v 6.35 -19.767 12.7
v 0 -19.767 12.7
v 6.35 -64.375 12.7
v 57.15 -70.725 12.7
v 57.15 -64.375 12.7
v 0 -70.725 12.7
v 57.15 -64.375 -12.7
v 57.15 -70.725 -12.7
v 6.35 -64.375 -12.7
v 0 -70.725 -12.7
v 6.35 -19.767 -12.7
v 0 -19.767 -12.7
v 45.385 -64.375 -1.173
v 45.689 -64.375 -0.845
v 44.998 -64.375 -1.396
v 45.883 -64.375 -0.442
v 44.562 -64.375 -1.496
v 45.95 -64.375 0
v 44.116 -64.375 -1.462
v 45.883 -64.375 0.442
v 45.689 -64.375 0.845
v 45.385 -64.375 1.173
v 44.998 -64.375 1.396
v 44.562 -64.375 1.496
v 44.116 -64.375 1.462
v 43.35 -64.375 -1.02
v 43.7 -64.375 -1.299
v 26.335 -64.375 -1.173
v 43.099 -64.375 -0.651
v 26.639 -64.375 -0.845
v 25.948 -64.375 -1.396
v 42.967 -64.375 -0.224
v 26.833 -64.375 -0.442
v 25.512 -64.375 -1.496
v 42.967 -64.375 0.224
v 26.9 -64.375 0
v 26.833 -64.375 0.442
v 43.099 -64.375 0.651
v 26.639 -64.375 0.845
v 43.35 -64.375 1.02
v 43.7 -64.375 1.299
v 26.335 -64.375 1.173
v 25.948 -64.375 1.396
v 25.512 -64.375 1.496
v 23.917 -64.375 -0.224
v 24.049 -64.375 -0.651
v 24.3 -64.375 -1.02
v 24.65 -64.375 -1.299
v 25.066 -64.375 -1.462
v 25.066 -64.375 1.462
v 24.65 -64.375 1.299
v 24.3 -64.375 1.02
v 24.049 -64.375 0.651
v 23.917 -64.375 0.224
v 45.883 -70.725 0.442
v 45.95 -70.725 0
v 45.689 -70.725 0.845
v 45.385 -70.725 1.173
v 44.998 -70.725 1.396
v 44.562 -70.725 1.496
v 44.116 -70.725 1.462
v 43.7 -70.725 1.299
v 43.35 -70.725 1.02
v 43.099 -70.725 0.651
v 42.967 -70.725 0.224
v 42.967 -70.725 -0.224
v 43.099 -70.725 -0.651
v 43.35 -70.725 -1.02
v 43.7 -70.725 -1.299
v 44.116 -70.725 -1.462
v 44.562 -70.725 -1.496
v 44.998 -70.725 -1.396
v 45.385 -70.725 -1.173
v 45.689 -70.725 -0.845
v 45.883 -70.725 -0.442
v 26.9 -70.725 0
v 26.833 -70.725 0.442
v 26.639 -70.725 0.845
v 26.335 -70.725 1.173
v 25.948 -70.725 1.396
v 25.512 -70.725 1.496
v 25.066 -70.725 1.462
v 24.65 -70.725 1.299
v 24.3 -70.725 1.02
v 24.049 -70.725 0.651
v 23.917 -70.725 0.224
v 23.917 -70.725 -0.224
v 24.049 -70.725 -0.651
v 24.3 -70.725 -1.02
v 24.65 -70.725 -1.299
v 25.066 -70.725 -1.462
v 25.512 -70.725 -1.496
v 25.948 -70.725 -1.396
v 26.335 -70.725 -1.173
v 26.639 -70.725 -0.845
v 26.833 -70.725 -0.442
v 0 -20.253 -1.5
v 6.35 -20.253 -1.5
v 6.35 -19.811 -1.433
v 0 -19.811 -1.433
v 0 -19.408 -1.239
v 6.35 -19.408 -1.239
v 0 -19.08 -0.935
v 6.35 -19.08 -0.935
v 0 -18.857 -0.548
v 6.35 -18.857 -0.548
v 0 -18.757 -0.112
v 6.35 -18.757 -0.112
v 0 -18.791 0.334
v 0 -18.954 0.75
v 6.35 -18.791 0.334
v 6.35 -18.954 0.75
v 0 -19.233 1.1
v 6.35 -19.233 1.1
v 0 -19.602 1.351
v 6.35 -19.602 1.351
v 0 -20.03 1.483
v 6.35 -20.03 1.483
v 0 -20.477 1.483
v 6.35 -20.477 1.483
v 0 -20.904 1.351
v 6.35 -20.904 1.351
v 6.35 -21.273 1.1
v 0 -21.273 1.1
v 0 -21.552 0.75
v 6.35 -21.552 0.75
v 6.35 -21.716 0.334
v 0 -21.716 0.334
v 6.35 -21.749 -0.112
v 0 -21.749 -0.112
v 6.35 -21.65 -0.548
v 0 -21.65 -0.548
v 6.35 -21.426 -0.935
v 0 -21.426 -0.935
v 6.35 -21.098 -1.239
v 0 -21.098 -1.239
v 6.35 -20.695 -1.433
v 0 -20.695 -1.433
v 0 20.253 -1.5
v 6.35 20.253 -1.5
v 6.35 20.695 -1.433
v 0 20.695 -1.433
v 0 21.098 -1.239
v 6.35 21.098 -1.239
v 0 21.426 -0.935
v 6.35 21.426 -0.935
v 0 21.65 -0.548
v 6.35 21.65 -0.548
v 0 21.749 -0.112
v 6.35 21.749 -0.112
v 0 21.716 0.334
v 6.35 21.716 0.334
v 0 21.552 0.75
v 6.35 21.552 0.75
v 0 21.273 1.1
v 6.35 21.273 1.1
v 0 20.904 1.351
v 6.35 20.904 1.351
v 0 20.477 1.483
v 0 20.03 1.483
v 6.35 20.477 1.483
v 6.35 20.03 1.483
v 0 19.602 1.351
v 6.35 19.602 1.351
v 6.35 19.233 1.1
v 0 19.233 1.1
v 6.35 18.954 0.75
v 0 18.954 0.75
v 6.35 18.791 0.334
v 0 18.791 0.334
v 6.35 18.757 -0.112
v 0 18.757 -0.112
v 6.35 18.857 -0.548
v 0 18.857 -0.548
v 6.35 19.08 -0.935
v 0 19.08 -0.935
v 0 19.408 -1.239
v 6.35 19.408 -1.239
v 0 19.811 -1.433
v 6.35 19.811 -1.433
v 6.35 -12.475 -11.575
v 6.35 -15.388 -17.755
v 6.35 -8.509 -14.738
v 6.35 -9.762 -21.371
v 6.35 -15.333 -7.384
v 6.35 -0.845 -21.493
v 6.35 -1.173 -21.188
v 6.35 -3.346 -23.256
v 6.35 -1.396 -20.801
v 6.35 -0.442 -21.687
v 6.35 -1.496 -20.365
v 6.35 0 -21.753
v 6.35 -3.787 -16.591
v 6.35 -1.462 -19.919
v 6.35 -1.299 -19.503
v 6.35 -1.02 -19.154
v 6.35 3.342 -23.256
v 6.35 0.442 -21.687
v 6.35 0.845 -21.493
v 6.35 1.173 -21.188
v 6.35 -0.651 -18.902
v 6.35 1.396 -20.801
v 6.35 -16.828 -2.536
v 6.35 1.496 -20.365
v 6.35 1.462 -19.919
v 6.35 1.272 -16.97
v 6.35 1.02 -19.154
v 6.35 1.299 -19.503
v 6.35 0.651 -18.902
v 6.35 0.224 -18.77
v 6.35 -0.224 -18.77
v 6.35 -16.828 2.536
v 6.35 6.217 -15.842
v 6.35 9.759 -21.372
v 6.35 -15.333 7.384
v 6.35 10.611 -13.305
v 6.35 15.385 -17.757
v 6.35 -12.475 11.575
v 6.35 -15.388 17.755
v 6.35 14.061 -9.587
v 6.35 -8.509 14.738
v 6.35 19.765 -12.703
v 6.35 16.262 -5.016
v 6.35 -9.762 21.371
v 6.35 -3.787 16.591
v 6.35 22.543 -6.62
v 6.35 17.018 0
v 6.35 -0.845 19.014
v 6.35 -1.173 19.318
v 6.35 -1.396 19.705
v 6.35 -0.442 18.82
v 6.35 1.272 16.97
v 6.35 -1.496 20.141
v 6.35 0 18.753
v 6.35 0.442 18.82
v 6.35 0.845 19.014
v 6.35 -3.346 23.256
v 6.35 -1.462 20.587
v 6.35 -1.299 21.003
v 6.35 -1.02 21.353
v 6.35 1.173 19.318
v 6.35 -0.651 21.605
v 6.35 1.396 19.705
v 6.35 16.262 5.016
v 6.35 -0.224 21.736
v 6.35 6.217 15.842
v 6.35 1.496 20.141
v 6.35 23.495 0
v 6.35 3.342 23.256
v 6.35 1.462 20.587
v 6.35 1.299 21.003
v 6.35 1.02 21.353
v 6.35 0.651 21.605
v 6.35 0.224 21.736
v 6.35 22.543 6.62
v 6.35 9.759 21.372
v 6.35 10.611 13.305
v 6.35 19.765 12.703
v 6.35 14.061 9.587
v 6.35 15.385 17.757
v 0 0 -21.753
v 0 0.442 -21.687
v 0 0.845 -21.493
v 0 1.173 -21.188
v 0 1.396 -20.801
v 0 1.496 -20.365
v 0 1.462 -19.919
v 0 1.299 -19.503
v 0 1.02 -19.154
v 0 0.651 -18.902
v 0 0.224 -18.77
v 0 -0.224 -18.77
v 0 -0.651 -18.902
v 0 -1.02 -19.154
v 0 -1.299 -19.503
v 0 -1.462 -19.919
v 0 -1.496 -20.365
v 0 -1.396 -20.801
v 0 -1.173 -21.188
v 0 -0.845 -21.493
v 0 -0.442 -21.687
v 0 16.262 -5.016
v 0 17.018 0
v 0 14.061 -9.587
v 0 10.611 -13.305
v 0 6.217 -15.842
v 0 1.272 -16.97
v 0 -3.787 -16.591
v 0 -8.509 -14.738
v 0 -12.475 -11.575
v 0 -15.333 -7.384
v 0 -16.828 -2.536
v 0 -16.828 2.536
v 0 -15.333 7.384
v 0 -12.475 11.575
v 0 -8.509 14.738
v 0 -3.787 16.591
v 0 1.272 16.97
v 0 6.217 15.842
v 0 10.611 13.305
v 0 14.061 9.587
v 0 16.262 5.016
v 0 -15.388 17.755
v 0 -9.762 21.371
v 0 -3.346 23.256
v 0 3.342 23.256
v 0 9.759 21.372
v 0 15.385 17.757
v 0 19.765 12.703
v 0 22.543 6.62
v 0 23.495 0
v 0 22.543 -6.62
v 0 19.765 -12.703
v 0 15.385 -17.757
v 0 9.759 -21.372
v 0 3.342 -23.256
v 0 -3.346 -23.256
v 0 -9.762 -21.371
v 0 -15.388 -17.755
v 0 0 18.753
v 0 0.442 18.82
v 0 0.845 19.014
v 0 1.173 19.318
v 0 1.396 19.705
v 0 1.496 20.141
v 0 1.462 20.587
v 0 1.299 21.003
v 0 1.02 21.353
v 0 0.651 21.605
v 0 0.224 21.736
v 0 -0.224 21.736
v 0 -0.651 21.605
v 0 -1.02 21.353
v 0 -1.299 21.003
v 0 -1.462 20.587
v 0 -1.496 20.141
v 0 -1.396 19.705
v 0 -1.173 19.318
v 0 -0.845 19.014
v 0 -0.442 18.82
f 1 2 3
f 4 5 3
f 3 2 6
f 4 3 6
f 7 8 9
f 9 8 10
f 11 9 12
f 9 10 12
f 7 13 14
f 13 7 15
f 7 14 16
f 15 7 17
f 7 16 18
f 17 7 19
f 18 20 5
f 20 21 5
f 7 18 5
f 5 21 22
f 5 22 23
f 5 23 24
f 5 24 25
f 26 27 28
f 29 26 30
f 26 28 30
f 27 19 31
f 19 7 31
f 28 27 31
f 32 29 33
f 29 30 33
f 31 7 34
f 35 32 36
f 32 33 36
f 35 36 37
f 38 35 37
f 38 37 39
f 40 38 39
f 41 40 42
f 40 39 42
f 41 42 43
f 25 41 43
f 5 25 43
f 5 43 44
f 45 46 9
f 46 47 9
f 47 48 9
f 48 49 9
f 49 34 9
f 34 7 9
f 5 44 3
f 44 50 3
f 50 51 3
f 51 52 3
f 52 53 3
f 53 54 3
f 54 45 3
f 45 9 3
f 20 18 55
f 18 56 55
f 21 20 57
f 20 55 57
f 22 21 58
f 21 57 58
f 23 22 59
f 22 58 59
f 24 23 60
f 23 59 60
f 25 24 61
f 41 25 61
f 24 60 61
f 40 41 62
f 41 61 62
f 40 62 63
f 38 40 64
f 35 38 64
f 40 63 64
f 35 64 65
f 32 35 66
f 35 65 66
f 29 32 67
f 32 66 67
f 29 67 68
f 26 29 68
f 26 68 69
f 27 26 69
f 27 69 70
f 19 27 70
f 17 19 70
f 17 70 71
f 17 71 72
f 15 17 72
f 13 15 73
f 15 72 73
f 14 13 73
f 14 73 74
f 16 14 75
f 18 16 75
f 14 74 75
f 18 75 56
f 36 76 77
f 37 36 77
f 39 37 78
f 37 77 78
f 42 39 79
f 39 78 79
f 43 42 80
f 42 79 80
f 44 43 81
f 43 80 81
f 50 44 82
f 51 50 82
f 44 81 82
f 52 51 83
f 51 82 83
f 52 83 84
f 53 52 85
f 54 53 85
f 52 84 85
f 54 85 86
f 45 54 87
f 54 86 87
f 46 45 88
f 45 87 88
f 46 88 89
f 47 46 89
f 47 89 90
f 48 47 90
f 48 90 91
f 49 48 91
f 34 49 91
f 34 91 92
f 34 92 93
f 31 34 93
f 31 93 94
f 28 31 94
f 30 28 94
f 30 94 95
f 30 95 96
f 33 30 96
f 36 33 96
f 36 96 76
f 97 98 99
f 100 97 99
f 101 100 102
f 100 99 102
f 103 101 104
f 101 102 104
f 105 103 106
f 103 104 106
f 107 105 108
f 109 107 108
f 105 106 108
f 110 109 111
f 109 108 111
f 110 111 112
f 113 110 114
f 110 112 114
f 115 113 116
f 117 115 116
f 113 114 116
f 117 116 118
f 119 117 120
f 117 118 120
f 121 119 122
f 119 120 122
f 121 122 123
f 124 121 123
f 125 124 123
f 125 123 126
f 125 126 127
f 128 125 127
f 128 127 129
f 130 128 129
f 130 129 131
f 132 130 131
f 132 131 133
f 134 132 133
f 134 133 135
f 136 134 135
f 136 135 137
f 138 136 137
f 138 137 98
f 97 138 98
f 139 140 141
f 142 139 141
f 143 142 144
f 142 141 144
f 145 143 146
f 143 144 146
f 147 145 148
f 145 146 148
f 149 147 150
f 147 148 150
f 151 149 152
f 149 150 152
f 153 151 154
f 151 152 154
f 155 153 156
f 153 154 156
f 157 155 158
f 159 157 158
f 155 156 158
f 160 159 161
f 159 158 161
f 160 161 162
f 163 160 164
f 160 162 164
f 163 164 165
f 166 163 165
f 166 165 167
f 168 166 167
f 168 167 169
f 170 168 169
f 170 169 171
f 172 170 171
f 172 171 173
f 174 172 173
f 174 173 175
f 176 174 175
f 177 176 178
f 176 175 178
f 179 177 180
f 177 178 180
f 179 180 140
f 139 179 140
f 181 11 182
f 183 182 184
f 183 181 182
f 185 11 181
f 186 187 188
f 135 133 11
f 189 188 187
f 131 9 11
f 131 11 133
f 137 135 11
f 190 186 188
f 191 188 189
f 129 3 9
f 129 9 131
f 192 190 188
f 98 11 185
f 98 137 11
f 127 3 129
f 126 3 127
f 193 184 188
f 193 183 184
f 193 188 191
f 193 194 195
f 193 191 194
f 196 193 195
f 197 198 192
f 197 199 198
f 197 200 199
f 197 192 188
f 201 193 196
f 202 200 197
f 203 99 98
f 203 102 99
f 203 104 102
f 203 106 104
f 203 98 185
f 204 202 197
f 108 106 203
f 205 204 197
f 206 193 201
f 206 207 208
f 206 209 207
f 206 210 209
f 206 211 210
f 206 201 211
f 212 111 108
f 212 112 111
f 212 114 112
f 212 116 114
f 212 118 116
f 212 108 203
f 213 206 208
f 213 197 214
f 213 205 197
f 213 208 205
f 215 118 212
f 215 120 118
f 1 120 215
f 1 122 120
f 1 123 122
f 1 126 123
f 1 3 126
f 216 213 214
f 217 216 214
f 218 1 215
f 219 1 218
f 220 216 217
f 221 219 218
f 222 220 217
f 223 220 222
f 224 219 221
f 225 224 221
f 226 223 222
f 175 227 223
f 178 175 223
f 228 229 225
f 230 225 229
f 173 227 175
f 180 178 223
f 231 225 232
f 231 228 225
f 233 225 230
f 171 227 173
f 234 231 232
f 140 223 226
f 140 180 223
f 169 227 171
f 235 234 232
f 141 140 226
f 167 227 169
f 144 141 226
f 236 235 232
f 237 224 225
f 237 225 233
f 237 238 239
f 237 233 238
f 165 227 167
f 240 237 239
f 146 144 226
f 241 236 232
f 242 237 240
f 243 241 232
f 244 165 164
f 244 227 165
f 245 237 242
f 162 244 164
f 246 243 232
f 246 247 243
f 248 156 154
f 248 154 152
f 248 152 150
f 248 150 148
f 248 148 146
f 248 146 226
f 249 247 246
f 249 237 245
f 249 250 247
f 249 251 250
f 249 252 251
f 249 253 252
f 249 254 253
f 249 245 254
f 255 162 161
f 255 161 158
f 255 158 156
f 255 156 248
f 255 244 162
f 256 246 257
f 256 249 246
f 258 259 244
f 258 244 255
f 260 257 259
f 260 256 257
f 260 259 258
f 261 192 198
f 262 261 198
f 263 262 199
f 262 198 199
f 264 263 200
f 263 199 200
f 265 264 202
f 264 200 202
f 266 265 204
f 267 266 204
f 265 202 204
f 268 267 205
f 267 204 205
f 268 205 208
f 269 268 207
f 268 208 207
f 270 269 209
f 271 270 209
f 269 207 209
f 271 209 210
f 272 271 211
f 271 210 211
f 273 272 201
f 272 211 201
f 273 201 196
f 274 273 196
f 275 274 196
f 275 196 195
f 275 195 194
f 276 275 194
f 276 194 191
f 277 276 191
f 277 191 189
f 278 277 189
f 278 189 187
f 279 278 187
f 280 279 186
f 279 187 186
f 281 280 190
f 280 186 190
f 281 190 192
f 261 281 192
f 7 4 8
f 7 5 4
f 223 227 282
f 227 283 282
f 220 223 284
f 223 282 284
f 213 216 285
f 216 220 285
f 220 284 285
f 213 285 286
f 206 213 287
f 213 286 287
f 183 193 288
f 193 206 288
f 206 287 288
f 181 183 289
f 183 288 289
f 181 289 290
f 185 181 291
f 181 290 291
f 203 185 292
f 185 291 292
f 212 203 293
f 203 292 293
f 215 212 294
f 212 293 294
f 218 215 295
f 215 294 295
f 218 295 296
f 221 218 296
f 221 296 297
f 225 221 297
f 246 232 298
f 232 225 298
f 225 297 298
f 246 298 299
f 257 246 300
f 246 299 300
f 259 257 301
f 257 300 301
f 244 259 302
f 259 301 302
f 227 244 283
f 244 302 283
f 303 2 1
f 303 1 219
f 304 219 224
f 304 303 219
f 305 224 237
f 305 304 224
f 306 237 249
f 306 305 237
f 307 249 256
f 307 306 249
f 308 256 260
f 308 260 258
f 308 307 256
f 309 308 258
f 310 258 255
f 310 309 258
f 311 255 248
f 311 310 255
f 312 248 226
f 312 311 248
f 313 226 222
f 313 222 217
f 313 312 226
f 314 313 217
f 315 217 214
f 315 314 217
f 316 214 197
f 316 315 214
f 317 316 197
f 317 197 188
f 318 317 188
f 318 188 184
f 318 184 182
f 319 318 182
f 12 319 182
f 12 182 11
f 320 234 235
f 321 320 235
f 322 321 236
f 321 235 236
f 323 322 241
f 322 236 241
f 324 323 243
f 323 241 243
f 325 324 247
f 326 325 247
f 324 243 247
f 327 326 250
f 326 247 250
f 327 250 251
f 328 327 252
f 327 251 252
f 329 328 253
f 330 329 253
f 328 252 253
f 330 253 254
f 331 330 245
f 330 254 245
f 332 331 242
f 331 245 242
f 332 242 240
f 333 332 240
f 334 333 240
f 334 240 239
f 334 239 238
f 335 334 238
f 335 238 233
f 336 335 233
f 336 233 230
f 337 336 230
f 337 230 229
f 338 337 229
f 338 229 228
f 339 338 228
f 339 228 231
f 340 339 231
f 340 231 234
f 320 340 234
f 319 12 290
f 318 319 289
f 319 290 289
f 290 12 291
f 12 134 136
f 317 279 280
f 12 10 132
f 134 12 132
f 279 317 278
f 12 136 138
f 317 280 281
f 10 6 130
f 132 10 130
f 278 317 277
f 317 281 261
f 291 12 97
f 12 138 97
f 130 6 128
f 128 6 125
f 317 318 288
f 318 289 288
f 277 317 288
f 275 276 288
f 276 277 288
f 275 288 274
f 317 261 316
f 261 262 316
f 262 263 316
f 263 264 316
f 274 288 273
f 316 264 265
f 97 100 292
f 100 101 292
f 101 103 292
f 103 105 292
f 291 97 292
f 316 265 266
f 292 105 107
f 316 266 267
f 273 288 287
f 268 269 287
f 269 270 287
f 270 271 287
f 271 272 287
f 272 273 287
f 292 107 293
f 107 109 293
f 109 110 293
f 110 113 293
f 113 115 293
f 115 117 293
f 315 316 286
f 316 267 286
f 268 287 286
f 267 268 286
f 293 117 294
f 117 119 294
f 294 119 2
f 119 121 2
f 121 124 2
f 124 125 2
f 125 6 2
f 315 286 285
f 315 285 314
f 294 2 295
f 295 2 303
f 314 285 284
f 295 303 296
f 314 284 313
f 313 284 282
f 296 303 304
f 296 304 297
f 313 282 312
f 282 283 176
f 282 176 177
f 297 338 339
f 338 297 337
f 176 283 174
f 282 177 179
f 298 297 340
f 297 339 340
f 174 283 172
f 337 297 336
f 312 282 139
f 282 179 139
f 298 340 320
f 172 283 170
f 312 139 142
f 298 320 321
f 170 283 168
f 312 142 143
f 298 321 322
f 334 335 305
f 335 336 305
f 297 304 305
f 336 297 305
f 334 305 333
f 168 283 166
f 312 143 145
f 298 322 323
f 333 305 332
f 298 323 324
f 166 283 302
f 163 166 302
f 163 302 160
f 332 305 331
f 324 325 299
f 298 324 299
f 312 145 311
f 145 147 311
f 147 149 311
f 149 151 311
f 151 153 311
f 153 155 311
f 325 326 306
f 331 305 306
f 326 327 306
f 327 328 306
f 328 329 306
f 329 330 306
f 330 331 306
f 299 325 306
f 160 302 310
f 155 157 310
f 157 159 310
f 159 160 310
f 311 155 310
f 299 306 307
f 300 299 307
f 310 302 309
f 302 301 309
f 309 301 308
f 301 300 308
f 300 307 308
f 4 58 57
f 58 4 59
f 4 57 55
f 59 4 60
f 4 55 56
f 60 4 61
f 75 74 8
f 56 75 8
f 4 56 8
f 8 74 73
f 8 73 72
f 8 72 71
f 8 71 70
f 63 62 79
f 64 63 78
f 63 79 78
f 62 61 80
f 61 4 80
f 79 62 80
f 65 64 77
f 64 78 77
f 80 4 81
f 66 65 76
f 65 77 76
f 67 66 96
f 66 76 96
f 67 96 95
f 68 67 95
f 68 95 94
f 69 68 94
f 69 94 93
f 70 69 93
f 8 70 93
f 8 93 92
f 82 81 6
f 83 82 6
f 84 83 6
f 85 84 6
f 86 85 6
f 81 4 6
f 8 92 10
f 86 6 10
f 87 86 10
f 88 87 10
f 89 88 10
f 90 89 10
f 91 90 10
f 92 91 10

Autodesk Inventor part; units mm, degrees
ref_plane "YZ Plane" through (0, 0, 0) normal (1, 0, 0) x (0, 1, 0)
ref_plane "XZ Plane" through (0, 0, 0) normal (0, 1, 0) x (-1, 0, 0)
ref_plane "XY Plane" through (0, 0, 0) normal (0, 0, 1) x (1, 0, 0)
sketch "Sketch1" plane through (0, 0, 0) normal (1, 0, 0) x (0, 1, 0)
  circle A0 centre (0, 0) radius 17.018
  circle A1 centre (0, 0) radius 23.495
  line L0 (-19.7668, 12.7) -> (-70.7247, 12.7)
  line L1 (-70.7247, 12.7) -> (-70.7247, -12.7)
  line L2 (-70.7247, -12.7) -> (-19.7668, -12.7)
  dimension "d0" = 6.477
  dimension "d1" = 34.036
  dimension "d7" = 25.4
extrude "Extrusion1" add sketch "Sketch1" along normal blind 6.35
sketch "Sketch2" plane through (6.35, 0, 0) normal (1, 0, 0) x (0, 0, -1)
  line L0 (-12.7, -19.7668) -> (-12.7, -70.7247) projected
  line L1 (12.7, -70.7247) -> (12.7, -19.7668) projected
  line L2 (-12.7, -70.7247) -> (12.7, -70.7247)
  line L3 (12.7, -70.7247) -> (12.7, -64.3747)
  line L4 (12.7, -64.3747) -> (-12.7, -64.3747)
  line L5 (-12.7, -64.3747) -> (-12.7, -70.7247)
  point P0 (0, 0)
  dimension "d10" = 6.35
extrude "Extrusion2" add sketch "Sketch2" along normal blind 50.8
sketch "Sketch3" plane through (0, -70.7247, -12.7) normal (0, -1, 0) x (1, 0, 0)
  circle A0 centre (25.4, 12.7) radius 1.5
  circle A1 centre (44.45, 12.7) radius 1.5
  line L0 (0, 25.4) -> (57.15, 25.4) projected
  line L1 (57.15, 25.4) -> (57.15, 0) projected
  line L2 (0, 25.4) -> (0, 0) projected
  point P0 (0, 12.7)
  dimension "d14" = 12.7
  dimension "d15" = 12.7
  dimension "d16" = 3
  dimension "d17" = 3
  dimension "d18" = 12.7
  dimension "d19" = 25.4
extrude "Extrusion3" cut sketch "Sketch3" against normal blind 50.8
sketch "Sketch4" plane through (6.35, 0, 0) normal (1, 0, 0) x (0, 0, -1)
  line L0 (0, 23.4884) -> (0, 17.018)
  circle A0 centre (0, 0) radius 17.018 projected
  circle A1 centre (0, 20.2532) radius 1.5
  circle A2 centre (-20.2532, 0) radius 1.5
  circle A3 centre (0, -20.2532) radius 1.5
  circle A4 centre (20.2532, 0) radius 1.5
  dimension "d22" = 3
  dimension "d25" = 360
extrude "Extrusion4" cut sketch "Sketch4" against normal blind 50.8 contours A1 L0 | L0 A1 | A2 | A3 | A4
properties part number "LED Hinge"
